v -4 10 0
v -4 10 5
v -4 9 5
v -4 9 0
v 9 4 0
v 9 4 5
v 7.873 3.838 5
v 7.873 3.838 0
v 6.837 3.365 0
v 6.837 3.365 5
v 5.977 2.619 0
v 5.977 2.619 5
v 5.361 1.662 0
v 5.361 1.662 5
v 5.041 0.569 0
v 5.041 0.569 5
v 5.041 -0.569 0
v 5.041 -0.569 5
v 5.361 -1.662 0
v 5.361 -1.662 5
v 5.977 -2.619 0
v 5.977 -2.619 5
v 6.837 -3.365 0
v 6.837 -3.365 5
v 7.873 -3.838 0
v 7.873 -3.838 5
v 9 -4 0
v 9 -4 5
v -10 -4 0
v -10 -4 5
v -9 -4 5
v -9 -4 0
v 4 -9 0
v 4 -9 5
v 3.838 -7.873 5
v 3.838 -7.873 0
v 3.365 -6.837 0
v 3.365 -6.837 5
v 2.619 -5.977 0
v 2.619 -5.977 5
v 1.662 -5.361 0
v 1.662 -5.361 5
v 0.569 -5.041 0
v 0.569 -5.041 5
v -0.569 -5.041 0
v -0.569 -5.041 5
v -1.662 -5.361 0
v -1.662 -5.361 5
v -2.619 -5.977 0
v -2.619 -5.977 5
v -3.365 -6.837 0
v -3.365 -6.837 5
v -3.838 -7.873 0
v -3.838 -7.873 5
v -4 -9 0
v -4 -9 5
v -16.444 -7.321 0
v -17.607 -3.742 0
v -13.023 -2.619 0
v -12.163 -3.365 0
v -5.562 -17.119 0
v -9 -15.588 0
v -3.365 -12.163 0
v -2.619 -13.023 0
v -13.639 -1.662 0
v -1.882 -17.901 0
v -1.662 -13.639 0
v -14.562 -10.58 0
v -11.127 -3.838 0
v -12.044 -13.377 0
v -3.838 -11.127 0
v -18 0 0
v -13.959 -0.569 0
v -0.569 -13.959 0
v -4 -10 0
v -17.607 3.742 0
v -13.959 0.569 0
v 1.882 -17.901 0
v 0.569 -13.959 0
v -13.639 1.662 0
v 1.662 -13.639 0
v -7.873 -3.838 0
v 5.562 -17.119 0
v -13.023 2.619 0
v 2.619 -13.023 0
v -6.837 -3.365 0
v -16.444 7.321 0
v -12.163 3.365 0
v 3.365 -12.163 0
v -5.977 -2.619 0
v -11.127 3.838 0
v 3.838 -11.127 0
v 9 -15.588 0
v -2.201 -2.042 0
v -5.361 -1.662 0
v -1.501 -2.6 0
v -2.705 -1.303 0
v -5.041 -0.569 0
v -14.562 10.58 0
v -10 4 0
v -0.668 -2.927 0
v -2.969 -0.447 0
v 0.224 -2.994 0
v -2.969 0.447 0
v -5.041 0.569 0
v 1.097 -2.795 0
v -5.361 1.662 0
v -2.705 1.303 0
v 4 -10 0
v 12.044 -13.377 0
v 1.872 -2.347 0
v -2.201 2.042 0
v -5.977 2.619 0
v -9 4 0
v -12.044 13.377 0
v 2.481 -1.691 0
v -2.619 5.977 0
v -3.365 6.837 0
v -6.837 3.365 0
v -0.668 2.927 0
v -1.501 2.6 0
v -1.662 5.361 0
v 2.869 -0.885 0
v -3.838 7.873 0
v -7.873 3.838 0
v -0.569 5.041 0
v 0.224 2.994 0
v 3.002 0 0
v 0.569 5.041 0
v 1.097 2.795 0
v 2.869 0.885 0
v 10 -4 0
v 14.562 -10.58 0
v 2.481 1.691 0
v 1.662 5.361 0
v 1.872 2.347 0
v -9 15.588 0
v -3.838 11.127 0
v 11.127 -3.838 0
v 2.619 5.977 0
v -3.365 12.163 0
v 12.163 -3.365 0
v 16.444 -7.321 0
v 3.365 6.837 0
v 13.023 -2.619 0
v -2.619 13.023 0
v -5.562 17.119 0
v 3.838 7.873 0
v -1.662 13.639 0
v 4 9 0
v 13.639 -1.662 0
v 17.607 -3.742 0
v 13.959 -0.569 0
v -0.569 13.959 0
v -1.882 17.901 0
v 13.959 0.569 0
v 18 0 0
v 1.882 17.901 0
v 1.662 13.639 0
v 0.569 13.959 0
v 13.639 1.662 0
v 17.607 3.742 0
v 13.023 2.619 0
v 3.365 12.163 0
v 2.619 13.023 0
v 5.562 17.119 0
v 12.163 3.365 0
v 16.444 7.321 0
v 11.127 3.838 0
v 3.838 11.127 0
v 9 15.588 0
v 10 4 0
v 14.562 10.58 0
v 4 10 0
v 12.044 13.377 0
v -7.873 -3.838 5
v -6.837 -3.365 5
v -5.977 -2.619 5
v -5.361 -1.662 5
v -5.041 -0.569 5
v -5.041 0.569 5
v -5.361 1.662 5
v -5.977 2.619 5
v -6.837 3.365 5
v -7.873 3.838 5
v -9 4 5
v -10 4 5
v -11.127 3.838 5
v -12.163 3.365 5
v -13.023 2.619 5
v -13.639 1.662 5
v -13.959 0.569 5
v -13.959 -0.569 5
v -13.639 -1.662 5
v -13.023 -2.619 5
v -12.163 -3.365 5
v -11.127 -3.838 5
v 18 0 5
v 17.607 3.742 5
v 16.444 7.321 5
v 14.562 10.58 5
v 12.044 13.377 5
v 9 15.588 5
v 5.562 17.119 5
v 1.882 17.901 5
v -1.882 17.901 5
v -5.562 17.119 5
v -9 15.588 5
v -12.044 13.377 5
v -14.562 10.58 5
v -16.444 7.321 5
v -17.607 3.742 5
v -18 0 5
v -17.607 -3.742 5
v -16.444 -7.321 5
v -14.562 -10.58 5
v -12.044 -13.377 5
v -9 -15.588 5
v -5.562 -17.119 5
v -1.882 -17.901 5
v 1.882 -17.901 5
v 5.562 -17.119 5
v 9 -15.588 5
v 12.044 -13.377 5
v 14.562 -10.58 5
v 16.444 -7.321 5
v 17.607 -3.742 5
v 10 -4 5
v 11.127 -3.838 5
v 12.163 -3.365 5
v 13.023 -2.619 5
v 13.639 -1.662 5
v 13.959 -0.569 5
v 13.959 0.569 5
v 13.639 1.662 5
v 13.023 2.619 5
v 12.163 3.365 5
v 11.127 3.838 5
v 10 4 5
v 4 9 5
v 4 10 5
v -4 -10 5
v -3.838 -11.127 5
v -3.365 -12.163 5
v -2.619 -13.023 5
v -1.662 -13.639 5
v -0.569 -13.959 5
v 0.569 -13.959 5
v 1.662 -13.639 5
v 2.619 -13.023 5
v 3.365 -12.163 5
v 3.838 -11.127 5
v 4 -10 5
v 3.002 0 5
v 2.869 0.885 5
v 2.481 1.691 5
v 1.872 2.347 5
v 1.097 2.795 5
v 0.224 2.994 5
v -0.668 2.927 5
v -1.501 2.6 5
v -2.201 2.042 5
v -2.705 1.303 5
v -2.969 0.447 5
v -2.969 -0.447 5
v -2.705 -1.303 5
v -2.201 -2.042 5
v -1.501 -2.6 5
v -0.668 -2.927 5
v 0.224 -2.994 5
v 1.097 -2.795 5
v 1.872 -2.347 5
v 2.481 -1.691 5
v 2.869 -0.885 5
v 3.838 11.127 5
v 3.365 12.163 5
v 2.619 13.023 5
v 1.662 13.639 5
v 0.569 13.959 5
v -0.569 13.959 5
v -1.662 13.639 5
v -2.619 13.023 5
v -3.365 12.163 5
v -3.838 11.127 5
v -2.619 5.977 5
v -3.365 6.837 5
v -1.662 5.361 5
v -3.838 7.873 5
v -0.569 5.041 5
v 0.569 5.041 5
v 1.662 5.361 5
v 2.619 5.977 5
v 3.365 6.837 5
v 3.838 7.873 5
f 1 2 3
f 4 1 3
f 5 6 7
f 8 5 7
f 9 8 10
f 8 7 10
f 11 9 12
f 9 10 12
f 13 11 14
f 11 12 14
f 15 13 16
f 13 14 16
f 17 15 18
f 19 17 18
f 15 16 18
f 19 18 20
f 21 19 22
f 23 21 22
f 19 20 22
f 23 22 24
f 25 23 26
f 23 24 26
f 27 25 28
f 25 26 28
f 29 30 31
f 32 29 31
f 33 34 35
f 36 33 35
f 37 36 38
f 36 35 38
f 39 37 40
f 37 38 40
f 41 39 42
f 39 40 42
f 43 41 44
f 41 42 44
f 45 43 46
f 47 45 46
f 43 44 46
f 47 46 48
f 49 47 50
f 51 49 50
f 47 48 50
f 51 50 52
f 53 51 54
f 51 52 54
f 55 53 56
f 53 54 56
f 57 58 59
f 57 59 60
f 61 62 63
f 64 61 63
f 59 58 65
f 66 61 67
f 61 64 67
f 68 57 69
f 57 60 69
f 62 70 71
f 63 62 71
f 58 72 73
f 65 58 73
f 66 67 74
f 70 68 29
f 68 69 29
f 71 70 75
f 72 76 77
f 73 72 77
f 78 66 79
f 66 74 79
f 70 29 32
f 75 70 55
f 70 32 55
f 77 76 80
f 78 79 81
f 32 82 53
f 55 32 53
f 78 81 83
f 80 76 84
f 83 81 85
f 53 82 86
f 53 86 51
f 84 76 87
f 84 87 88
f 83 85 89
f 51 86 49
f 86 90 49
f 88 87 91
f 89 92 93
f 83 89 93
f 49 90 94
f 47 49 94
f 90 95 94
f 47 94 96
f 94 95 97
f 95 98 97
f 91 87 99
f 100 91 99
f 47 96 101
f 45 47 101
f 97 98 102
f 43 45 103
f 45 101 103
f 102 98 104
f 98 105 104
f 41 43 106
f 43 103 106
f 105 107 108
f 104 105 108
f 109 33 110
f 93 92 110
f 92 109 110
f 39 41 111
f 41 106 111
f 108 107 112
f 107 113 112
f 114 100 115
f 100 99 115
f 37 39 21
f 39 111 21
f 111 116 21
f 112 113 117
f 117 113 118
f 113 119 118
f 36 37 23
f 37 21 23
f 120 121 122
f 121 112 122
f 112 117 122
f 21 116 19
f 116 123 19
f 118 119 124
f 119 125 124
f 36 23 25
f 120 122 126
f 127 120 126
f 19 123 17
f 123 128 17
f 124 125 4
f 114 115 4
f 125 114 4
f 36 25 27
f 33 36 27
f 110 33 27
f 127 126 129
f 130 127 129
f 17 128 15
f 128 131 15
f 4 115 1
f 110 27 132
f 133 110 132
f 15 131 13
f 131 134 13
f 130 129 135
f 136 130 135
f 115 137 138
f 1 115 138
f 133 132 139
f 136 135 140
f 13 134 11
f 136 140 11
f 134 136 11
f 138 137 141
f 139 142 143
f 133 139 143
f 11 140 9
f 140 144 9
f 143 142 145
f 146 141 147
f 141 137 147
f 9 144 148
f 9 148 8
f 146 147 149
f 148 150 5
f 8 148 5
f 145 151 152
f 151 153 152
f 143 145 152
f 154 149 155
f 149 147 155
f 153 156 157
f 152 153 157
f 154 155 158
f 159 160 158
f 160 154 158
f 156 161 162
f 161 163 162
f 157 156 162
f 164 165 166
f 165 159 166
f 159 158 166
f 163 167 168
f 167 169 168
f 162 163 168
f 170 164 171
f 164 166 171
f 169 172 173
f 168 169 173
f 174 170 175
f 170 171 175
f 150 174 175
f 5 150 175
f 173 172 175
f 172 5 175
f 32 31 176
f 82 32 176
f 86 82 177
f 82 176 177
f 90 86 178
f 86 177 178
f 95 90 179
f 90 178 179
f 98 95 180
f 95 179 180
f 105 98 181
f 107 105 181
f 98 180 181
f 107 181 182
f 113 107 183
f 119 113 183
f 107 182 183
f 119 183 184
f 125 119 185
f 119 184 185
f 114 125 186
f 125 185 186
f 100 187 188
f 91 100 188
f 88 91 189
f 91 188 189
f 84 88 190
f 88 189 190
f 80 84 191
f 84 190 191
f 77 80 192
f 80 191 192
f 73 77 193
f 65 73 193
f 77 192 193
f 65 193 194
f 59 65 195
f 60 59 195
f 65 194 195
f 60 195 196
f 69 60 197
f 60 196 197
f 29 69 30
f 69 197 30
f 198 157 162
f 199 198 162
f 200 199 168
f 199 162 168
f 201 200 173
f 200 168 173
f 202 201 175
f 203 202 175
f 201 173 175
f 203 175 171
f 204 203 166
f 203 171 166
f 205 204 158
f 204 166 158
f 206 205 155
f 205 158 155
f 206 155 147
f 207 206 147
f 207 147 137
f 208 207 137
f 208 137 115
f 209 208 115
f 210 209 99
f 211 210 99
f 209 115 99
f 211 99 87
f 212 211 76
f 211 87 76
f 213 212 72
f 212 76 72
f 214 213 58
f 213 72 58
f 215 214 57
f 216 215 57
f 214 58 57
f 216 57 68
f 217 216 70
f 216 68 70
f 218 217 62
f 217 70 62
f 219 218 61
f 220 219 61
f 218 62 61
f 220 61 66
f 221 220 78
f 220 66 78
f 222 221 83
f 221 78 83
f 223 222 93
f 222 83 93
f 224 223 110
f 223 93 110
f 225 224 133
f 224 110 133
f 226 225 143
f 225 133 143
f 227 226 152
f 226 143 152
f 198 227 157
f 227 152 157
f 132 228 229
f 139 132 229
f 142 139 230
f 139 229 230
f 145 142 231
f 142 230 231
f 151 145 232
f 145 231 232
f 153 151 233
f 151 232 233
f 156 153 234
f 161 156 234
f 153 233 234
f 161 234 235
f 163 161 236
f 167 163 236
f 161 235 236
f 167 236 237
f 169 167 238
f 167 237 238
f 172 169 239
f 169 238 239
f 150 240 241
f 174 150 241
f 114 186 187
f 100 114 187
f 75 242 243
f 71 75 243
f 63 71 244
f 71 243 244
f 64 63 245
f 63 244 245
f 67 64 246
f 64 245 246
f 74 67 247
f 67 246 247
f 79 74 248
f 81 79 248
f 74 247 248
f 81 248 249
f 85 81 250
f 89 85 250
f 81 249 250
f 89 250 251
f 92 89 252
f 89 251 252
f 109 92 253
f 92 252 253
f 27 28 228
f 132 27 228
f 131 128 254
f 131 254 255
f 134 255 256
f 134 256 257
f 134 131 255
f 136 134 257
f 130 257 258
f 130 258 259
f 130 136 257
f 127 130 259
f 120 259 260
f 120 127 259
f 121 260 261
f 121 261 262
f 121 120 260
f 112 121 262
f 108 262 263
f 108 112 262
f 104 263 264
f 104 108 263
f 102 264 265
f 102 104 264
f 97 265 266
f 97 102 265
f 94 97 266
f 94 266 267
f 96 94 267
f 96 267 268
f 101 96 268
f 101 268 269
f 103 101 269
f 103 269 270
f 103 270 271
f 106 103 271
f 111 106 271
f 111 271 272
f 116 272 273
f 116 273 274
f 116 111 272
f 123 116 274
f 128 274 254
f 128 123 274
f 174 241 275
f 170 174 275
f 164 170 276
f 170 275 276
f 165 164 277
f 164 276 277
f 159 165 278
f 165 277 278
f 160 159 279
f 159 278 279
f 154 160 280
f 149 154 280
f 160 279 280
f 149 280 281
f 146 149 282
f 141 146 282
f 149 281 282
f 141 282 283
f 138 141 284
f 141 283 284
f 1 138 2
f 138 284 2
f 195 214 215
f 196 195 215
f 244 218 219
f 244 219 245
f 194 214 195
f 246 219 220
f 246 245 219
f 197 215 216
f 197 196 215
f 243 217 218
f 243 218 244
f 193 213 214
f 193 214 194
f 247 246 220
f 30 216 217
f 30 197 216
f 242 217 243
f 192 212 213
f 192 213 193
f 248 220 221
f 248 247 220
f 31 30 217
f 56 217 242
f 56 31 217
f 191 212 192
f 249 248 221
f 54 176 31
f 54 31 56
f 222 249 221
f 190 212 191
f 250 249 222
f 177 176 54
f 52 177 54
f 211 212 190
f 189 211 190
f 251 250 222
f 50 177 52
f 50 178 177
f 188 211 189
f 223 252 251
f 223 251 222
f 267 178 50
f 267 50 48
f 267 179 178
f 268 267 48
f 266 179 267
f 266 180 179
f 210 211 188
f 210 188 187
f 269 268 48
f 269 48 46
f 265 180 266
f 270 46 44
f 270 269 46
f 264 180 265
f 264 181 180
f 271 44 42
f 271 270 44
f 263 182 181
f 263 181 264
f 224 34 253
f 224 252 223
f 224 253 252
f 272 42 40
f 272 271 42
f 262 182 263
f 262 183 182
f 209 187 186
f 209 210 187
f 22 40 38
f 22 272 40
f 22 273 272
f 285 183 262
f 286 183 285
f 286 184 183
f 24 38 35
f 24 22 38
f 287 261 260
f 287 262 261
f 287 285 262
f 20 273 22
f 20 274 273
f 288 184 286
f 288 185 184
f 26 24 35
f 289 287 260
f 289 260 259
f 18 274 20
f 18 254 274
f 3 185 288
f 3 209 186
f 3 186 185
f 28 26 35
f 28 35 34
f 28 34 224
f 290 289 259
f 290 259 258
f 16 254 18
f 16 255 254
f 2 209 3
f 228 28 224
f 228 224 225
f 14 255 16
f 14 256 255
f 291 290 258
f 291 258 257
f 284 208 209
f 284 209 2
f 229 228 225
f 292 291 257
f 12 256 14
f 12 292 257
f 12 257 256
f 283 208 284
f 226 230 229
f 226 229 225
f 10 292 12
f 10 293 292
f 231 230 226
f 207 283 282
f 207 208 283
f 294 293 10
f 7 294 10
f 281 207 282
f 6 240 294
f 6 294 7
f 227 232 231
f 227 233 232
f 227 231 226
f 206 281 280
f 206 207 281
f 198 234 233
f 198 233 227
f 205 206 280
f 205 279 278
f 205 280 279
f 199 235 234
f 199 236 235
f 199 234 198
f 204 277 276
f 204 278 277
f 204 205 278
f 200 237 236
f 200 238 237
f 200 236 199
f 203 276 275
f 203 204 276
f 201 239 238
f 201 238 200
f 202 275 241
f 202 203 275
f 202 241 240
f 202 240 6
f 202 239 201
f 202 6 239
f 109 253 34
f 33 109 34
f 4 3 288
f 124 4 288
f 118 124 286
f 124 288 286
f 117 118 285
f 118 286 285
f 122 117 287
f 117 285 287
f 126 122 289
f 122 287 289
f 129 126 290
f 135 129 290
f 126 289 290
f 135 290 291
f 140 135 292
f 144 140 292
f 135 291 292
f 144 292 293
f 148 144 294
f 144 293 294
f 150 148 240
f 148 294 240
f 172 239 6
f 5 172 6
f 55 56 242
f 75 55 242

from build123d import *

# Parameters (mm, degrees)
ESQUISSE1_R             = 18
ESQUISSE1_R_2           = 3.0025
BOSS_EXTRU_1_DEPTH      = 5
ENL_V_MAT_EXTRU_1_DEPTH = 5


with BuildPart() as part:
    # Esquisse1 → Boss.-Extru.1 (new body)
    with BuildSketch(Plane.XY):
        Circle(ESQUISSE1_R)
        Circle(ESQUISSE1_R_2, mode=Mode.SUBTRACT)
    extrude(amount=BOSS_EXTRU_1_DEPTH)

    # Esquisse2 → Enlèv. mat.-Extru.1 (cut)
    with BuildSketch(Plane.XY.offset(5)):
        with BuildLine():
            Line((-4, 10), (-4, 9))
            ThreePointArc((-4, 9), (0, 5), (4, 9))
            Line((4, 9), (4, 10))
            ThreePointArc((4, 10), (0, 14), (-4, 10))
        make_face()
        with BuildLine():
            Line((-10, -4), (-9, -4))
            ThreePointArc((-9, -4), (-5, 0), (-9, 4))
            Line((-9, 4), (-10, 4))
            ThreePointArc((-10, 4), (-14, 0), (-10, -4))
        make_face()
        with BuildLine():
            Line((4, -10), (4, -9))
            ThreePointArc((4, -9), (0, -5), (-4, -9))
            Line((-4, -9), (-4, -10))
            ThreePointArc((-4, -10), (0, -14), (4, -10))
        make_face()
        with BuildLine():
            Line((10, 4), (9, 4))
            ThreePointArc((9, 4), (5, 0), (9, -4))
            Line((9, -4), (10, -4))
            ThreePointArc((10, -4), (14, 0), (10, 4))
        make_face()
    extrude(amount=-ENL_V_MAT_EXTRU_1_DEPTH, mode=Mode.SUBTRACT)


solid = part.part
